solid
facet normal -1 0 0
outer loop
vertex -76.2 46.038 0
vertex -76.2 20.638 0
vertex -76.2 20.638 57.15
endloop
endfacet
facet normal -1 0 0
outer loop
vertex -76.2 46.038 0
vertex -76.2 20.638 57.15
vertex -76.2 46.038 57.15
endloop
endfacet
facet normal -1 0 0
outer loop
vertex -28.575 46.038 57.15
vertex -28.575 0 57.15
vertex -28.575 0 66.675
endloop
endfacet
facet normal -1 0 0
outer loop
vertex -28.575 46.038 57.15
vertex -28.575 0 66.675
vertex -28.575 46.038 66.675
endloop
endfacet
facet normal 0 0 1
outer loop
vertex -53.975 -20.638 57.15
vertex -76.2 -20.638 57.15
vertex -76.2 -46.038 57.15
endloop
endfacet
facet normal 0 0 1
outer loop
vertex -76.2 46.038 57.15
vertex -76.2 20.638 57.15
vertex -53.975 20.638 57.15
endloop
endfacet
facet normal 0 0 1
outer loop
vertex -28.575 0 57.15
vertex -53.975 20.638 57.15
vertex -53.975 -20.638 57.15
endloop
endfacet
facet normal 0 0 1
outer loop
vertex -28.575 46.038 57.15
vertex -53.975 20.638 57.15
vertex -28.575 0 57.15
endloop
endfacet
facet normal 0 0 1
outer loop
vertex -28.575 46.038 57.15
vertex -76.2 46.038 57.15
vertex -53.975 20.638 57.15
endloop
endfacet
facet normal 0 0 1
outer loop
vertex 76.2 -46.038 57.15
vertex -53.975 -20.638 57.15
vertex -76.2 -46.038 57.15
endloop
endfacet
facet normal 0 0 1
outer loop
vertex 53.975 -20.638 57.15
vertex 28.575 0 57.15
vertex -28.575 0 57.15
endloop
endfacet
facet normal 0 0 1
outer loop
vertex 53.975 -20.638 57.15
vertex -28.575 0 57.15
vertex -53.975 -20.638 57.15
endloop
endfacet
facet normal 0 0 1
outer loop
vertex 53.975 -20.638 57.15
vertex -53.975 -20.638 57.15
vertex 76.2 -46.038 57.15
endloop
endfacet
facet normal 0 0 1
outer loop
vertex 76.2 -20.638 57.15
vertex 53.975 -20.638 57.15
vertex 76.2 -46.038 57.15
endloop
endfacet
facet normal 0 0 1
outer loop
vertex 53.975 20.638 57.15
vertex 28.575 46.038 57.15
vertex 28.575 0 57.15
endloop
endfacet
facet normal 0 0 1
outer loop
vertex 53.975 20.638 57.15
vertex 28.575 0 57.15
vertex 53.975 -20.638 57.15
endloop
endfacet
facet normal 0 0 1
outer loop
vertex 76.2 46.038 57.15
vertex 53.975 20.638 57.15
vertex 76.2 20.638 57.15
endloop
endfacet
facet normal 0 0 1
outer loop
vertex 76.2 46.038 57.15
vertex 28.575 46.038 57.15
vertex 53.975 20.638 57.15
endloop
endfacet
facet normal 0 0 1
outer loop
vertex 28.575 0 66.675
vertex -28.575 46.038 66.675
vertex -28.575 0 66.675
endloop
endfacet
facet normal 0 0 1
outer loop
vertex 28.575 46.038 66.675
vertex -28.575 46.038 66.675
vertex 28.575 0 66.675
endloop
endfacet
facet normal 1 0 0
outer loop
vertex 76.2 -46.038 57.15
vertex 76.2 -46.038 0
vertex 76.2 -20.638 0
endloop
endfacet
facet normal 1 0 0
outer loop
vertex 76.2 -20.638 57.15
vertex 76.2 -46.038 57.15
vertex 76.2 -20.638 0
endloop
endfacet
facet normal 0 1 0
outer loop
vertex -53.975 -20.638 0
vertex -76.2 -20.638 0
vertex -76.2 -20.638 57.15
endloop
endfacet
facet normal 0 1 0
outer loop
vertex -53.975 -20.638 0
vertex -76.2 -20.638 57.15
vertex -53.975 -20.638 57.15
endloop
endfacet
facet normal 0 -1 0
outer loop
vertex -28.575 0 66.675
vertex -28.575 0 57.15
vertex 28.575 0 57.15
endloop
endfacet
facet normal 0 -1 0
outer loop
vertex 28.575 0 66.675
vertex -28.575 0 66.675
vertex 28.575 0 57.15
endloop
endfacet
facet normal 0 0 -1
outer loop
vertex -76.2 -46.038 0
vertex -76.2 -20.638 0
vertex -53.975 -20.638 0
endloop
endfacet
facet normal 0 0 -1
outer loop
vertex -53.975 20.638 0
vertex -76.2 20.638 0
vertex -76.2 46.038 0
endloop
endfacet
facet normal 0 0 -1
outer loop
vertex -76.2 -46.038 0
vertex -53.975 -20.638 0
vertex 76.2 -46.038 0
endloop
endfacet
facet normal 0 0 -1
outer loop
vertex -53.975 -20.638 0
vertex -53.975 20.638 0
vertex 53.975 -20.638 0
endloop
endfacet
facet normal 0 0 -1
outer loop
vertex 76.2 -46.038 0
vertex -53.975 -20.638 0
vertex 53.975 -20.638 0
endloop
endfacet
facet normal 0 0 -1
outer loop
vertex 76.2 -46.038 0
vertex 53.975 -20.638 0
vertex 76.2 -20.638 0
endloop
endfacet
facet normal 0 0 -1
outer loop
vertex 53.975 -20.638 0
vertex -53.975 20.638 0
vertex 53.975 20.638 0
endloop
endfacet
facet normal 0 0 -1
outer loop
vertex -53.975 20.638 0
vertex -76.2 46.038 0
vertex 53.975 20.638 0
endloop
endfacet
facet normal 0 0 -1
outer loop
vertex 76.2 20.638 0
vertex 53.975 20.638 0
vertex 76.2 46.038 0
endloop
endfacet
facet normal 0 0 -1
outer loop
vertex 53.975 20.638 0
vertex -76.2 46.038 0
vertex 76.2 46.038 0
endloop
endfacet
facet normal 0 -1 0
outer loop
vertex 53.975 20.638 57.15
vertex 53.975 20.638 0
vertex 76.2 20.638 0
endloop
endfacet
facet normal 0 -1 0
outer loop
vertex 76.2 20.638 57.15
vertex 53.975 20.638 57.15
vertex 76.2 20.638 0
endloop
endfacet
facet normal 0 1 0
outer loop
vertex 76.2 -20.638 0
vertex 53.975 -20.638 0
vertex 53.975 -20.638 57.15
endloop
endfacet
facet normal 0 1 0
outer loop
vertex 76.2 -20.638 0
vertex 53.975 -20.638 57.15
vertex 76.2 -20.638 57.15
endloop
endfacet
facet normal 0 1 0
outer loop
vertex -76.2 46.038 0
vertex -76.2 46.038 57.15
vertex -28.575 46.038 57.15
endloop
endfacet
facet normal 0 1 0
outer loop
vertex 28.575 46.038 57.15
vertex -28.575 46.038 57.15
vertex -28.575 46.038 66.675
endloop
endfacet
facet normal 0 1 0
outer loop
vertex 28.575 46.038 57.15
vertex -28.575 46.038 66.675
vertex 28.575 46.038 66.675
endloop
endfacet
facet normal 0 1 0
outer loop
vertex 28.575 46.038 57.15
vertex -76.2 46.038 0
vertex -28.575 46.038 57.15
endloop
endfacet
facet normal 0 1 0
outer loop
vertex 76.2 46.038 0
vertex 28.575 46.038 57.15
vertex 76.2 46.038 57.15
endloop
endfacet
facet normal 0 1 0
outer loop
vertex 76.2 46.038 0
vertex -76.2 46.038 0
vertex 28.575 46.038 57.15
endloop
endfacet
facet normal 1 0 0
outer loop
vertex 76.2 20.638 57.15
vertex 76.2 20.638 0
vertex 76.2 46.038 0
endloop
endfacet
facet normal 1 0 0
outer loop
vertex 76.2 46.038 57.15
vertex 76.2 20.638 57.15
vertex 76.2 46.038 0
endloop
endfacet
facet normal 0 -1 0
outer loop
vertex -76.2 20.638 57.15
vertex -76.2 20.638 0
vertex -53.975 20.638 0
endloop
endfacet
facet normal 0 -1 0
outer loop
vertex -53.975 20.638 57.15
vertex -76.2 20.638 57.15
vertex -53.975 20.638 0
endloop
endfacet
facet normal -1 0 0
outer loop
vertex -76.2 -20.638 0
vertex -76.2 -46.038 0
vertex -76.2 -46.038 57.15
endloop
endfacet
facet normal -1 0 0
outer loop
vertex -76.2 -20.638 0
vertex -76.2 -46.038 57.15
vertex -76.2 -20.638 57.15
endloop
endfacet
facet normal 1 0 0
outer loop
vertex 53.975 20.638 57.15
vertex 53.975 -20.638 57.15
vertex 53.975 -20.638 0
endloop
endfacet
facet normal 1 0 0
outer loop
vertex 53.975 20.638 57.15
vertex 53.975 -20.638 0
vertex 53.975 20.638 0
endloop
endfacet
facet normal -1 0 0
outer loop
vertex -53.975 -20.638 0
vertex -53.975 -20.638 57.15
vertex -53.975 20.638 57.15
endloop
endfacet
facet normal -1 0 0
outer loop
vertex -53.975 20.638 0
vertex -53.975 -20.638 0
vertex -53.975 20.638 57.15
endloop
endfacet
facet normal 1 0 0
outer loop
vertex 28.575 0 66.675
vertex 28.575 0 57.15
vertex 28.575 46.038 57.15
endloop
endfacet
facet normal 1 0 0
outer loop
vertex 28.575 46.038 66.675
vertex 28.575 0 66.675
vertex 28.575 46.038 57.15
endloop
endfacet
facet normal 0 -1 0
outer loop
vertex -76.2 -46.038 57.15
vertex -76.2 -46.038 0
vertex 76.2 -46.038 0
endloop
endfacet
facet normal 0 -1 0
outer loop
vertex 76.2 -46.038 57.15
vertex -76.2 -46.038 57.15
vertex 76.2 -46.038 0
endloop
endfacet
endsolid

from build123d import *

# Parameters (mm, degrees)
F0_W     = 152.4
F0_H     = 92.075
F1_DEPTH = 57.15
F2_W     = 57.15
F2_H     = 46.0375
F3_DEPTH = 9.525
F4_W     = 22.225
F4_H     = 41.275
F5_DEPTH = 57.15


with BuildPart() as f1:
    # F0 (on Top) → F1 (new body)
    with BuildSketch(Plane.XY):
        Rectangle(F0_W, F0_H)
    extrude(amount=F1_DEPTH)

    # F2 (on face) → F3 (join)
    with BuildSketch(Plane.XY.offset(57.15)):
        with Locations((0, 23.01875)):
            Rectangle(F2_W, F2_H)
    extrude(amount=F3_DEPTH)

    # F4 (on face) → F5 (cut)
    with BuildSketch(Plane.XY.offset(57.15)):
        with Locations((-65.0875, 0)):
            Rectangle(F4_W, F4_H)
        with Locations((65.0875, 0)):
            Rectangle(F4_W, F4_H)
    extrude(amount=-F5_DEPTH, mode=Mode.SUBTRACT)


solid = f1.part
